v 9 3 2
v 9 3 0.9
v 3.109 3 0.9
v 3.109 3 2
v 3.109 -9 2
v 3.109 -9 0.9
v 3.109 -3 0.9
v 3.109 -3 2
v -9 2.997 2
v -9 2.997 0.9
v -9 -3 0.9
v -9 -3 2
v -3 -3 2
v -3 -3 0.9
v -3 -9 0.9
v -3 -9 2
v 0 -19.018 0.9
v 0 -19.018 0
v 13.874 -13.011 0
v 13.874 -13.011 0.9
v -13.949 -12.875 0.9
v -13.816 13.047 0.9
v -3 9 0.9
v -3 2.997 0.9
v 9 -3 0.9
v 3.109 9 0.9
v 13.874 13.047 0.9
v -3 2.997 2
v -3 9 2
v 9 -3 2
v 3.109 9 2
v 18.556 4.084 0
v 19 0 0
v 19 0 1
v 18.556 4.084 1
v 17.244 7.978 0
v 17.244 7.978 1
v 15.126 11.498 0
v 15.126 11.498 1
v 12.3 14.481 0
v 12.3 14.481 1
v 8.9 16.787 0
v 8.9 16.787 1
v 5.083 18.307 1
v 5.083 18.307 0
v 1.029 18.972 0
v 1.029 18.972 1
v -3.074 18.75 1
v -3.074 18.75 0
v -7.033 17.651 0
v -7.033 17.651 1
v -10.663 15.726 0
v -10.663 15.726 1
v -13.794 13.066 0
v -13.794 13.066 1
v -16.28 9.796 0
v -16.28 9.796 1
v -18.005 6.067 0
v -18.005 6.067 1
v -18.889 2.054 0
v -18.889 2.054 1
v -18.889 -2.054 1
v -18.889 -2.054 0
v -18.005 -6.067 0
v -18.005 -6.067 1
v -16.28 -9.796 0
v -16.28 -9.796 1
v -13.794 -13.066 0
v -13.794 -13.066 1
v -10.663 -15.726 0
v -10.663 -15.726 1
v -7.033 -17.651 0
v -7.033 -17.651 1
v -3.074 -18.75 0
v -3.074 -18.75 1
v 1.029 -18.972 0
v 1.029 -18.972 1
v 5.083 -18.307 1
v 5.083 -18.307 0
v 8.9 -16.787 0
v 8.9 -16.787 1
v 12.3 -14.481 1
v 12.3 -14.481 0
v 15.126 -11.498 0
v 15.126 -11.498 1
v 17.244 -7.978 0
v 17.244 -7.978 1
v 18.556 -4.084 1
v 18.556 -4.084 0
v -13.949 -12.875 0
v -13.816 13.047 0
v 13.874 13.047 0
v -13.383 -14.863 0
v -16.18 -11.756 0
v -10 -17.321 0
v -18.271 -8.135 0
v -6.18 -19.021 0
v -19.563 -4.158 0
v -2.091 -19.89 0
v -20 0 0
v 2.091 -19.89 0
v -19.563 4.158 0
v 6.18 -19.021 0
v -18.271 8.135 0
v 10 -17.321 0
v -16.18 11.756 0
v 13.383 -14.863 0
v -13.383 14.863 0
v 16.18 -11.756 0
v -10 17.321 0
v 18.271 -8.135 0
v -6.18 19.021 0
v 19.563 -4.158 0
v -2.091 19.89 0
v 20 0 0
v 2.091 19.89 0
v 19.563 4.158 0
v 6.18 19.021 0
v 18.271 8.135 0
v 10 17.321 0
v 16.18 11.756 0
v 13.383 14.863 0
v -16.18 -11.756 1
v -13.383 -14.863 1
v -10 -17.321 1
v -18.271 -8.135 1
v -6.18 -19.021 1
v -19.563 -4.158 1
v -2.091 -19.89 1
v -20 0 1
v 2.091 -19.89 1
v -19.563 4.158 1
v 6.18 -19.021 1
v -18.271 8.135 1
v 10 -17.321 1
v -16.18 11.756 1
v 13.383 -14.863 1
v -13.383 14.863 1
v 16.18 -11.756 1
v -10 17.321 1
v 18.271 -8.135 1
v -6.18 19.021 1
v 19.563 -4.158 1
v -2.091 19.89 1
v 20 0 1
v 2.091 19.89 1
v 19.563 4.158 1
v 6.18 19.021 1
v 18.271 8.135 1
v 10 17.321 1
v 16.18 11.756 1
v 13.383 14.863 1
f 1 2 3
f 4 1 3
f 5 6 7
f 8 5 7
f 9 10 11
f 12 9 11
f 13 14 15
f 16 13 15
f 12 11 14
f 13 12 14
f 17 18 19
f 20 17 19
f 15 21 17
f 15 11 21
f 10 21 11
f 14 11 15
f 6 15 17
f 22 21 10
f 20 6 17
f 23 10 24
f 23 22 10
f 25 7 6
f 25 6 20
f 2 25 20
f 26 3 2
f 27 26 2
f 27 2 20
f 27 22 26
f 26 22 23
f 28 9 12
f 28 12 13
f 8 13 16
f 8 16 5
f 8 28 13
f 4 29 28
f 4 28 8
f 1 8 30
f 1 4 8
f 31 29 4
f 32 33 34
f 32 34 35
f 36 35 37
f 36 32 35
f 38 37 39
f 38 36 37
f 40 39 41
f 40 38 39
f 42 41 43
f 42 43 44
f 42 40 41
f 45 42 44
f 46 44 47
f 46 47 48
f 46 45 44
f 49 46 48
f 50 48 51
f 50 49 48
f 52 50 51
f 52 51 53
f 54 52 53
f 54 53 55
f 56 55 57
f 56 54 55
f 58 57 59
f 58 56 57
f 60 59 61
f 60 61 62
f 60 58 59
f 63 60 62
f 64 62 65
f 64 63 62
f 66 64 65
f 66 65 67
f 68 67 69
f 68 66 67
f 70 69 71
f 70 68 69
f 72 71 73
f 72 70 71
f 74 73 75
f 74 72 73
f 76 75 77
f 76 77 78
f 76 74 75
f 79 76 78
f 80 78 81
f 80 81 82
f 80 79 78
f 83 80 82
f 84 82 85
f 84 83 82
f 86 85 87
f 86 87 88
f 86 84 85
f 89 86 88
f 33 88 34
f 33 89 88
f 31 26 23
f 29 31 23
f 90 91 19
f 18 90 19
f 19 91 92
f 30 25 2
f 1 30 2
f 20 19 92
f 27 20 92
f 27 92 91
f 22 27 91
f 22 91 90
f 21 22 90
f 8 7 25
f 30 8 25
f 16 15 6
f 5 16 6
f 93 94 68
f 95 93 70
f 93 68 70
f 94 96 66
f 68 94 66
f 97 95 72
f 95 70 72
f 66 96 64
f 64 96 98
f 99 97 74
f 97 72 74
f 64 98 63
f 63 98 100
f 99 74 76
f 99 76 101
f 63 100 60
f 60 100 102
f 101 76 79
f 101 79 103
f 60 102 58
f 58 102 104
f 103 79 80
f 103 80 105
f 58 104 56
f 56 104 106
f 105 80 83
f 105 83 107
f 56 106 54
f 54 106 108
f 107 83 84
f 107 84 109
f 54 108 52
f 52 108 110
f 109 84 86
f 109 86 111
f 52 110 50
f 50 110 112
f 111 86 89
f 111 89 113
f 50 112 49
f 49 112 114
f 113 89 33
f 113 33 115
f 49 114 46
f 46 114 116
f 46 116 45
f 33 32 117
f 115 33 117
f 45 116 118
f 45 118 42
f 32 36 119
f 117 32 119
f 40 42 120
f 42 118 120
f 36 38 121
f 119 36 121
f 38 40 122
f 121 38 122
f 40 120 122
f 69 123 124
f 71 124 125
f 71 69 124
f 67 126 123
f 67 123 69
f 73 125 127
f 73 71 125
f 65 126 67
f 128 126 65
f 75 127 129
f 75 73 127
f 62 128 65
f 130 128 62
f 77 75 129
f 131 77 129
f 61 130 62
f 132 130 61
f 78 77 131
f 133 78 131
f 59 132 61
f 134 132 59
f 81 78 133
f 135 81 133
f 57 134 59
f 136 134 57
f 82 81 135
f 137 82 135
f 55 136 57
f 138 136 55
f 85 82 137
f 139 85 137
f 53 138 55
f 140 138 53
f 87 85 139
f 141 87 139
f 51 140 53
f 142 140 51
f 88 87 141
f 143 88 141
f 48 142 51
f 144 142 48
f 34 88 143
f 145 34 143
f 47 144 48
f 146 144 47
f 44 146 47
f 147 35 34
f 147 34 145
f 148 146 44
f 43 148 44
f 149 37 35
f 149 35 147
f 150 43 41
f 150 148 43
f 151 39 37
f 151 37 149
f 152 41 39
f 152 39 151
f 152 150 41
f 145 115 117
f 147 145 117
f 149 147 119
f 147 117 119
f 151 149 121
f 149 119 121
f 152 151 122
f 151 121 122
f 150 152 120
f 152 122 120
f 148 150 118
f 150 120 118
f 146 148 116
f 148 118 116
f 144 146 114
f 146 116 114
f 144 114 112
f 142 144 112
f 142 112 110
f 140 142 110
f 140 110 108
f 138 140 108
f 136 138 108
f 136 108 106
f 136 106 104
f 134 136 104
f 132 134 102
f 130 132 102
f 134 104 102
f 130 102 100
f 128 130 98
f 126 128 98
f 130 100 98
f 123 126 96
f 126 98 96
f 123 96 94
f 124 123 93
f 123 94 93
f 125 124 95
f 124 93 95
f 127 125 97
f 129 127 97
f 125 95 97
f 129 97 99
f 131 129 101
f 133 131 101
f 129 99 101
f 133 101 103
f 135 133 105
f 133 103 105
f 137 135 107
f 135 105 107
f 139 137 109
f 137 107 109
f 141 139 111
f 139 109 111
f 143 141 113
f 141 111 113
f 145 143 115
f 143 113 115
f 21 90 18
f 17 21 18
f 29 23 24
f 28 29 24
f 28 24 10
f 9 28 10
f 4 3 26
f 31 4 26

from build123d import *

# Parameters (mm, degrees)
F0_R     = 20
F0_R_2   = 19
F1_DEPTH = 1
F3_W     = 3
F3_H     = 3
F3_H_2   = 2.9973080382
F4_DEPTH = 2
F5_DEPTH = 0.9


with BuildPart() as f1:
    # F0 (on Top) → F1 (new body)
    with BuildSketch(Plane.XY):
        Circle(F0_R)
        Circle(F0_R_2, mode=Mode.SUBTRACT)
    extrude(amount=F1_DEPTH)


with BuildPart() as f4:
    # F3 (on Top) → F4 (new body)
    with BuildSketch(Plane.XY):
        Polygon((0, 2.9973080382), (0, 0), (3, 0), (3.1091126148, 0), (3.1091126148, 3), (0, 3), align=None)
        with Locations((-1.5, -1.5)):
            Rectangle(F3_W, F3_H)
        with Locations((-1.5, 1.4986540191)):
            Rectangle(F3_W, F3_H_2)
        Polygon((3, 0), (0, 0), (0, -3), (3.1091126148, -3), (3.1091126148, 0), align=None)
        Polygon((-3, -3), (-3, 0), (-3, 2.9973080382), (-9, 2.9973080382), (-9, -3), align=None)
        Polygon((-3, 2.9973080382), (0, 2.9973080382), (0, 3), (3.1091126148, 3), (3.1091126148, 9), (-3, 9), align=None)
        Polygon((3.1091126148, -3), (0, -3), (-3, -3), (-3, -9), (3.1091126148, -9), align=None)
        Polygon((3.1091126148, 3), (3.1091126148, 0), (3.1091126148, -3), (9, -3), (9, 3), align=None)
    extrude(amount=F4_DEPTH)

    # F2 (on Top) → F5 (join)
    with BuildSketch(Plane.XY):
        Polygon((13.8742914423, 13.047458604), (-13.8160753995, 13.047458604), (-13.9490468428, -12.8750633448), (0, -19.018009305), (13.8742914423, -13.0112969406), align=None)
    extrude(amount=F5_DEPTH)


solid = Compound([f1.part, f4.part])
